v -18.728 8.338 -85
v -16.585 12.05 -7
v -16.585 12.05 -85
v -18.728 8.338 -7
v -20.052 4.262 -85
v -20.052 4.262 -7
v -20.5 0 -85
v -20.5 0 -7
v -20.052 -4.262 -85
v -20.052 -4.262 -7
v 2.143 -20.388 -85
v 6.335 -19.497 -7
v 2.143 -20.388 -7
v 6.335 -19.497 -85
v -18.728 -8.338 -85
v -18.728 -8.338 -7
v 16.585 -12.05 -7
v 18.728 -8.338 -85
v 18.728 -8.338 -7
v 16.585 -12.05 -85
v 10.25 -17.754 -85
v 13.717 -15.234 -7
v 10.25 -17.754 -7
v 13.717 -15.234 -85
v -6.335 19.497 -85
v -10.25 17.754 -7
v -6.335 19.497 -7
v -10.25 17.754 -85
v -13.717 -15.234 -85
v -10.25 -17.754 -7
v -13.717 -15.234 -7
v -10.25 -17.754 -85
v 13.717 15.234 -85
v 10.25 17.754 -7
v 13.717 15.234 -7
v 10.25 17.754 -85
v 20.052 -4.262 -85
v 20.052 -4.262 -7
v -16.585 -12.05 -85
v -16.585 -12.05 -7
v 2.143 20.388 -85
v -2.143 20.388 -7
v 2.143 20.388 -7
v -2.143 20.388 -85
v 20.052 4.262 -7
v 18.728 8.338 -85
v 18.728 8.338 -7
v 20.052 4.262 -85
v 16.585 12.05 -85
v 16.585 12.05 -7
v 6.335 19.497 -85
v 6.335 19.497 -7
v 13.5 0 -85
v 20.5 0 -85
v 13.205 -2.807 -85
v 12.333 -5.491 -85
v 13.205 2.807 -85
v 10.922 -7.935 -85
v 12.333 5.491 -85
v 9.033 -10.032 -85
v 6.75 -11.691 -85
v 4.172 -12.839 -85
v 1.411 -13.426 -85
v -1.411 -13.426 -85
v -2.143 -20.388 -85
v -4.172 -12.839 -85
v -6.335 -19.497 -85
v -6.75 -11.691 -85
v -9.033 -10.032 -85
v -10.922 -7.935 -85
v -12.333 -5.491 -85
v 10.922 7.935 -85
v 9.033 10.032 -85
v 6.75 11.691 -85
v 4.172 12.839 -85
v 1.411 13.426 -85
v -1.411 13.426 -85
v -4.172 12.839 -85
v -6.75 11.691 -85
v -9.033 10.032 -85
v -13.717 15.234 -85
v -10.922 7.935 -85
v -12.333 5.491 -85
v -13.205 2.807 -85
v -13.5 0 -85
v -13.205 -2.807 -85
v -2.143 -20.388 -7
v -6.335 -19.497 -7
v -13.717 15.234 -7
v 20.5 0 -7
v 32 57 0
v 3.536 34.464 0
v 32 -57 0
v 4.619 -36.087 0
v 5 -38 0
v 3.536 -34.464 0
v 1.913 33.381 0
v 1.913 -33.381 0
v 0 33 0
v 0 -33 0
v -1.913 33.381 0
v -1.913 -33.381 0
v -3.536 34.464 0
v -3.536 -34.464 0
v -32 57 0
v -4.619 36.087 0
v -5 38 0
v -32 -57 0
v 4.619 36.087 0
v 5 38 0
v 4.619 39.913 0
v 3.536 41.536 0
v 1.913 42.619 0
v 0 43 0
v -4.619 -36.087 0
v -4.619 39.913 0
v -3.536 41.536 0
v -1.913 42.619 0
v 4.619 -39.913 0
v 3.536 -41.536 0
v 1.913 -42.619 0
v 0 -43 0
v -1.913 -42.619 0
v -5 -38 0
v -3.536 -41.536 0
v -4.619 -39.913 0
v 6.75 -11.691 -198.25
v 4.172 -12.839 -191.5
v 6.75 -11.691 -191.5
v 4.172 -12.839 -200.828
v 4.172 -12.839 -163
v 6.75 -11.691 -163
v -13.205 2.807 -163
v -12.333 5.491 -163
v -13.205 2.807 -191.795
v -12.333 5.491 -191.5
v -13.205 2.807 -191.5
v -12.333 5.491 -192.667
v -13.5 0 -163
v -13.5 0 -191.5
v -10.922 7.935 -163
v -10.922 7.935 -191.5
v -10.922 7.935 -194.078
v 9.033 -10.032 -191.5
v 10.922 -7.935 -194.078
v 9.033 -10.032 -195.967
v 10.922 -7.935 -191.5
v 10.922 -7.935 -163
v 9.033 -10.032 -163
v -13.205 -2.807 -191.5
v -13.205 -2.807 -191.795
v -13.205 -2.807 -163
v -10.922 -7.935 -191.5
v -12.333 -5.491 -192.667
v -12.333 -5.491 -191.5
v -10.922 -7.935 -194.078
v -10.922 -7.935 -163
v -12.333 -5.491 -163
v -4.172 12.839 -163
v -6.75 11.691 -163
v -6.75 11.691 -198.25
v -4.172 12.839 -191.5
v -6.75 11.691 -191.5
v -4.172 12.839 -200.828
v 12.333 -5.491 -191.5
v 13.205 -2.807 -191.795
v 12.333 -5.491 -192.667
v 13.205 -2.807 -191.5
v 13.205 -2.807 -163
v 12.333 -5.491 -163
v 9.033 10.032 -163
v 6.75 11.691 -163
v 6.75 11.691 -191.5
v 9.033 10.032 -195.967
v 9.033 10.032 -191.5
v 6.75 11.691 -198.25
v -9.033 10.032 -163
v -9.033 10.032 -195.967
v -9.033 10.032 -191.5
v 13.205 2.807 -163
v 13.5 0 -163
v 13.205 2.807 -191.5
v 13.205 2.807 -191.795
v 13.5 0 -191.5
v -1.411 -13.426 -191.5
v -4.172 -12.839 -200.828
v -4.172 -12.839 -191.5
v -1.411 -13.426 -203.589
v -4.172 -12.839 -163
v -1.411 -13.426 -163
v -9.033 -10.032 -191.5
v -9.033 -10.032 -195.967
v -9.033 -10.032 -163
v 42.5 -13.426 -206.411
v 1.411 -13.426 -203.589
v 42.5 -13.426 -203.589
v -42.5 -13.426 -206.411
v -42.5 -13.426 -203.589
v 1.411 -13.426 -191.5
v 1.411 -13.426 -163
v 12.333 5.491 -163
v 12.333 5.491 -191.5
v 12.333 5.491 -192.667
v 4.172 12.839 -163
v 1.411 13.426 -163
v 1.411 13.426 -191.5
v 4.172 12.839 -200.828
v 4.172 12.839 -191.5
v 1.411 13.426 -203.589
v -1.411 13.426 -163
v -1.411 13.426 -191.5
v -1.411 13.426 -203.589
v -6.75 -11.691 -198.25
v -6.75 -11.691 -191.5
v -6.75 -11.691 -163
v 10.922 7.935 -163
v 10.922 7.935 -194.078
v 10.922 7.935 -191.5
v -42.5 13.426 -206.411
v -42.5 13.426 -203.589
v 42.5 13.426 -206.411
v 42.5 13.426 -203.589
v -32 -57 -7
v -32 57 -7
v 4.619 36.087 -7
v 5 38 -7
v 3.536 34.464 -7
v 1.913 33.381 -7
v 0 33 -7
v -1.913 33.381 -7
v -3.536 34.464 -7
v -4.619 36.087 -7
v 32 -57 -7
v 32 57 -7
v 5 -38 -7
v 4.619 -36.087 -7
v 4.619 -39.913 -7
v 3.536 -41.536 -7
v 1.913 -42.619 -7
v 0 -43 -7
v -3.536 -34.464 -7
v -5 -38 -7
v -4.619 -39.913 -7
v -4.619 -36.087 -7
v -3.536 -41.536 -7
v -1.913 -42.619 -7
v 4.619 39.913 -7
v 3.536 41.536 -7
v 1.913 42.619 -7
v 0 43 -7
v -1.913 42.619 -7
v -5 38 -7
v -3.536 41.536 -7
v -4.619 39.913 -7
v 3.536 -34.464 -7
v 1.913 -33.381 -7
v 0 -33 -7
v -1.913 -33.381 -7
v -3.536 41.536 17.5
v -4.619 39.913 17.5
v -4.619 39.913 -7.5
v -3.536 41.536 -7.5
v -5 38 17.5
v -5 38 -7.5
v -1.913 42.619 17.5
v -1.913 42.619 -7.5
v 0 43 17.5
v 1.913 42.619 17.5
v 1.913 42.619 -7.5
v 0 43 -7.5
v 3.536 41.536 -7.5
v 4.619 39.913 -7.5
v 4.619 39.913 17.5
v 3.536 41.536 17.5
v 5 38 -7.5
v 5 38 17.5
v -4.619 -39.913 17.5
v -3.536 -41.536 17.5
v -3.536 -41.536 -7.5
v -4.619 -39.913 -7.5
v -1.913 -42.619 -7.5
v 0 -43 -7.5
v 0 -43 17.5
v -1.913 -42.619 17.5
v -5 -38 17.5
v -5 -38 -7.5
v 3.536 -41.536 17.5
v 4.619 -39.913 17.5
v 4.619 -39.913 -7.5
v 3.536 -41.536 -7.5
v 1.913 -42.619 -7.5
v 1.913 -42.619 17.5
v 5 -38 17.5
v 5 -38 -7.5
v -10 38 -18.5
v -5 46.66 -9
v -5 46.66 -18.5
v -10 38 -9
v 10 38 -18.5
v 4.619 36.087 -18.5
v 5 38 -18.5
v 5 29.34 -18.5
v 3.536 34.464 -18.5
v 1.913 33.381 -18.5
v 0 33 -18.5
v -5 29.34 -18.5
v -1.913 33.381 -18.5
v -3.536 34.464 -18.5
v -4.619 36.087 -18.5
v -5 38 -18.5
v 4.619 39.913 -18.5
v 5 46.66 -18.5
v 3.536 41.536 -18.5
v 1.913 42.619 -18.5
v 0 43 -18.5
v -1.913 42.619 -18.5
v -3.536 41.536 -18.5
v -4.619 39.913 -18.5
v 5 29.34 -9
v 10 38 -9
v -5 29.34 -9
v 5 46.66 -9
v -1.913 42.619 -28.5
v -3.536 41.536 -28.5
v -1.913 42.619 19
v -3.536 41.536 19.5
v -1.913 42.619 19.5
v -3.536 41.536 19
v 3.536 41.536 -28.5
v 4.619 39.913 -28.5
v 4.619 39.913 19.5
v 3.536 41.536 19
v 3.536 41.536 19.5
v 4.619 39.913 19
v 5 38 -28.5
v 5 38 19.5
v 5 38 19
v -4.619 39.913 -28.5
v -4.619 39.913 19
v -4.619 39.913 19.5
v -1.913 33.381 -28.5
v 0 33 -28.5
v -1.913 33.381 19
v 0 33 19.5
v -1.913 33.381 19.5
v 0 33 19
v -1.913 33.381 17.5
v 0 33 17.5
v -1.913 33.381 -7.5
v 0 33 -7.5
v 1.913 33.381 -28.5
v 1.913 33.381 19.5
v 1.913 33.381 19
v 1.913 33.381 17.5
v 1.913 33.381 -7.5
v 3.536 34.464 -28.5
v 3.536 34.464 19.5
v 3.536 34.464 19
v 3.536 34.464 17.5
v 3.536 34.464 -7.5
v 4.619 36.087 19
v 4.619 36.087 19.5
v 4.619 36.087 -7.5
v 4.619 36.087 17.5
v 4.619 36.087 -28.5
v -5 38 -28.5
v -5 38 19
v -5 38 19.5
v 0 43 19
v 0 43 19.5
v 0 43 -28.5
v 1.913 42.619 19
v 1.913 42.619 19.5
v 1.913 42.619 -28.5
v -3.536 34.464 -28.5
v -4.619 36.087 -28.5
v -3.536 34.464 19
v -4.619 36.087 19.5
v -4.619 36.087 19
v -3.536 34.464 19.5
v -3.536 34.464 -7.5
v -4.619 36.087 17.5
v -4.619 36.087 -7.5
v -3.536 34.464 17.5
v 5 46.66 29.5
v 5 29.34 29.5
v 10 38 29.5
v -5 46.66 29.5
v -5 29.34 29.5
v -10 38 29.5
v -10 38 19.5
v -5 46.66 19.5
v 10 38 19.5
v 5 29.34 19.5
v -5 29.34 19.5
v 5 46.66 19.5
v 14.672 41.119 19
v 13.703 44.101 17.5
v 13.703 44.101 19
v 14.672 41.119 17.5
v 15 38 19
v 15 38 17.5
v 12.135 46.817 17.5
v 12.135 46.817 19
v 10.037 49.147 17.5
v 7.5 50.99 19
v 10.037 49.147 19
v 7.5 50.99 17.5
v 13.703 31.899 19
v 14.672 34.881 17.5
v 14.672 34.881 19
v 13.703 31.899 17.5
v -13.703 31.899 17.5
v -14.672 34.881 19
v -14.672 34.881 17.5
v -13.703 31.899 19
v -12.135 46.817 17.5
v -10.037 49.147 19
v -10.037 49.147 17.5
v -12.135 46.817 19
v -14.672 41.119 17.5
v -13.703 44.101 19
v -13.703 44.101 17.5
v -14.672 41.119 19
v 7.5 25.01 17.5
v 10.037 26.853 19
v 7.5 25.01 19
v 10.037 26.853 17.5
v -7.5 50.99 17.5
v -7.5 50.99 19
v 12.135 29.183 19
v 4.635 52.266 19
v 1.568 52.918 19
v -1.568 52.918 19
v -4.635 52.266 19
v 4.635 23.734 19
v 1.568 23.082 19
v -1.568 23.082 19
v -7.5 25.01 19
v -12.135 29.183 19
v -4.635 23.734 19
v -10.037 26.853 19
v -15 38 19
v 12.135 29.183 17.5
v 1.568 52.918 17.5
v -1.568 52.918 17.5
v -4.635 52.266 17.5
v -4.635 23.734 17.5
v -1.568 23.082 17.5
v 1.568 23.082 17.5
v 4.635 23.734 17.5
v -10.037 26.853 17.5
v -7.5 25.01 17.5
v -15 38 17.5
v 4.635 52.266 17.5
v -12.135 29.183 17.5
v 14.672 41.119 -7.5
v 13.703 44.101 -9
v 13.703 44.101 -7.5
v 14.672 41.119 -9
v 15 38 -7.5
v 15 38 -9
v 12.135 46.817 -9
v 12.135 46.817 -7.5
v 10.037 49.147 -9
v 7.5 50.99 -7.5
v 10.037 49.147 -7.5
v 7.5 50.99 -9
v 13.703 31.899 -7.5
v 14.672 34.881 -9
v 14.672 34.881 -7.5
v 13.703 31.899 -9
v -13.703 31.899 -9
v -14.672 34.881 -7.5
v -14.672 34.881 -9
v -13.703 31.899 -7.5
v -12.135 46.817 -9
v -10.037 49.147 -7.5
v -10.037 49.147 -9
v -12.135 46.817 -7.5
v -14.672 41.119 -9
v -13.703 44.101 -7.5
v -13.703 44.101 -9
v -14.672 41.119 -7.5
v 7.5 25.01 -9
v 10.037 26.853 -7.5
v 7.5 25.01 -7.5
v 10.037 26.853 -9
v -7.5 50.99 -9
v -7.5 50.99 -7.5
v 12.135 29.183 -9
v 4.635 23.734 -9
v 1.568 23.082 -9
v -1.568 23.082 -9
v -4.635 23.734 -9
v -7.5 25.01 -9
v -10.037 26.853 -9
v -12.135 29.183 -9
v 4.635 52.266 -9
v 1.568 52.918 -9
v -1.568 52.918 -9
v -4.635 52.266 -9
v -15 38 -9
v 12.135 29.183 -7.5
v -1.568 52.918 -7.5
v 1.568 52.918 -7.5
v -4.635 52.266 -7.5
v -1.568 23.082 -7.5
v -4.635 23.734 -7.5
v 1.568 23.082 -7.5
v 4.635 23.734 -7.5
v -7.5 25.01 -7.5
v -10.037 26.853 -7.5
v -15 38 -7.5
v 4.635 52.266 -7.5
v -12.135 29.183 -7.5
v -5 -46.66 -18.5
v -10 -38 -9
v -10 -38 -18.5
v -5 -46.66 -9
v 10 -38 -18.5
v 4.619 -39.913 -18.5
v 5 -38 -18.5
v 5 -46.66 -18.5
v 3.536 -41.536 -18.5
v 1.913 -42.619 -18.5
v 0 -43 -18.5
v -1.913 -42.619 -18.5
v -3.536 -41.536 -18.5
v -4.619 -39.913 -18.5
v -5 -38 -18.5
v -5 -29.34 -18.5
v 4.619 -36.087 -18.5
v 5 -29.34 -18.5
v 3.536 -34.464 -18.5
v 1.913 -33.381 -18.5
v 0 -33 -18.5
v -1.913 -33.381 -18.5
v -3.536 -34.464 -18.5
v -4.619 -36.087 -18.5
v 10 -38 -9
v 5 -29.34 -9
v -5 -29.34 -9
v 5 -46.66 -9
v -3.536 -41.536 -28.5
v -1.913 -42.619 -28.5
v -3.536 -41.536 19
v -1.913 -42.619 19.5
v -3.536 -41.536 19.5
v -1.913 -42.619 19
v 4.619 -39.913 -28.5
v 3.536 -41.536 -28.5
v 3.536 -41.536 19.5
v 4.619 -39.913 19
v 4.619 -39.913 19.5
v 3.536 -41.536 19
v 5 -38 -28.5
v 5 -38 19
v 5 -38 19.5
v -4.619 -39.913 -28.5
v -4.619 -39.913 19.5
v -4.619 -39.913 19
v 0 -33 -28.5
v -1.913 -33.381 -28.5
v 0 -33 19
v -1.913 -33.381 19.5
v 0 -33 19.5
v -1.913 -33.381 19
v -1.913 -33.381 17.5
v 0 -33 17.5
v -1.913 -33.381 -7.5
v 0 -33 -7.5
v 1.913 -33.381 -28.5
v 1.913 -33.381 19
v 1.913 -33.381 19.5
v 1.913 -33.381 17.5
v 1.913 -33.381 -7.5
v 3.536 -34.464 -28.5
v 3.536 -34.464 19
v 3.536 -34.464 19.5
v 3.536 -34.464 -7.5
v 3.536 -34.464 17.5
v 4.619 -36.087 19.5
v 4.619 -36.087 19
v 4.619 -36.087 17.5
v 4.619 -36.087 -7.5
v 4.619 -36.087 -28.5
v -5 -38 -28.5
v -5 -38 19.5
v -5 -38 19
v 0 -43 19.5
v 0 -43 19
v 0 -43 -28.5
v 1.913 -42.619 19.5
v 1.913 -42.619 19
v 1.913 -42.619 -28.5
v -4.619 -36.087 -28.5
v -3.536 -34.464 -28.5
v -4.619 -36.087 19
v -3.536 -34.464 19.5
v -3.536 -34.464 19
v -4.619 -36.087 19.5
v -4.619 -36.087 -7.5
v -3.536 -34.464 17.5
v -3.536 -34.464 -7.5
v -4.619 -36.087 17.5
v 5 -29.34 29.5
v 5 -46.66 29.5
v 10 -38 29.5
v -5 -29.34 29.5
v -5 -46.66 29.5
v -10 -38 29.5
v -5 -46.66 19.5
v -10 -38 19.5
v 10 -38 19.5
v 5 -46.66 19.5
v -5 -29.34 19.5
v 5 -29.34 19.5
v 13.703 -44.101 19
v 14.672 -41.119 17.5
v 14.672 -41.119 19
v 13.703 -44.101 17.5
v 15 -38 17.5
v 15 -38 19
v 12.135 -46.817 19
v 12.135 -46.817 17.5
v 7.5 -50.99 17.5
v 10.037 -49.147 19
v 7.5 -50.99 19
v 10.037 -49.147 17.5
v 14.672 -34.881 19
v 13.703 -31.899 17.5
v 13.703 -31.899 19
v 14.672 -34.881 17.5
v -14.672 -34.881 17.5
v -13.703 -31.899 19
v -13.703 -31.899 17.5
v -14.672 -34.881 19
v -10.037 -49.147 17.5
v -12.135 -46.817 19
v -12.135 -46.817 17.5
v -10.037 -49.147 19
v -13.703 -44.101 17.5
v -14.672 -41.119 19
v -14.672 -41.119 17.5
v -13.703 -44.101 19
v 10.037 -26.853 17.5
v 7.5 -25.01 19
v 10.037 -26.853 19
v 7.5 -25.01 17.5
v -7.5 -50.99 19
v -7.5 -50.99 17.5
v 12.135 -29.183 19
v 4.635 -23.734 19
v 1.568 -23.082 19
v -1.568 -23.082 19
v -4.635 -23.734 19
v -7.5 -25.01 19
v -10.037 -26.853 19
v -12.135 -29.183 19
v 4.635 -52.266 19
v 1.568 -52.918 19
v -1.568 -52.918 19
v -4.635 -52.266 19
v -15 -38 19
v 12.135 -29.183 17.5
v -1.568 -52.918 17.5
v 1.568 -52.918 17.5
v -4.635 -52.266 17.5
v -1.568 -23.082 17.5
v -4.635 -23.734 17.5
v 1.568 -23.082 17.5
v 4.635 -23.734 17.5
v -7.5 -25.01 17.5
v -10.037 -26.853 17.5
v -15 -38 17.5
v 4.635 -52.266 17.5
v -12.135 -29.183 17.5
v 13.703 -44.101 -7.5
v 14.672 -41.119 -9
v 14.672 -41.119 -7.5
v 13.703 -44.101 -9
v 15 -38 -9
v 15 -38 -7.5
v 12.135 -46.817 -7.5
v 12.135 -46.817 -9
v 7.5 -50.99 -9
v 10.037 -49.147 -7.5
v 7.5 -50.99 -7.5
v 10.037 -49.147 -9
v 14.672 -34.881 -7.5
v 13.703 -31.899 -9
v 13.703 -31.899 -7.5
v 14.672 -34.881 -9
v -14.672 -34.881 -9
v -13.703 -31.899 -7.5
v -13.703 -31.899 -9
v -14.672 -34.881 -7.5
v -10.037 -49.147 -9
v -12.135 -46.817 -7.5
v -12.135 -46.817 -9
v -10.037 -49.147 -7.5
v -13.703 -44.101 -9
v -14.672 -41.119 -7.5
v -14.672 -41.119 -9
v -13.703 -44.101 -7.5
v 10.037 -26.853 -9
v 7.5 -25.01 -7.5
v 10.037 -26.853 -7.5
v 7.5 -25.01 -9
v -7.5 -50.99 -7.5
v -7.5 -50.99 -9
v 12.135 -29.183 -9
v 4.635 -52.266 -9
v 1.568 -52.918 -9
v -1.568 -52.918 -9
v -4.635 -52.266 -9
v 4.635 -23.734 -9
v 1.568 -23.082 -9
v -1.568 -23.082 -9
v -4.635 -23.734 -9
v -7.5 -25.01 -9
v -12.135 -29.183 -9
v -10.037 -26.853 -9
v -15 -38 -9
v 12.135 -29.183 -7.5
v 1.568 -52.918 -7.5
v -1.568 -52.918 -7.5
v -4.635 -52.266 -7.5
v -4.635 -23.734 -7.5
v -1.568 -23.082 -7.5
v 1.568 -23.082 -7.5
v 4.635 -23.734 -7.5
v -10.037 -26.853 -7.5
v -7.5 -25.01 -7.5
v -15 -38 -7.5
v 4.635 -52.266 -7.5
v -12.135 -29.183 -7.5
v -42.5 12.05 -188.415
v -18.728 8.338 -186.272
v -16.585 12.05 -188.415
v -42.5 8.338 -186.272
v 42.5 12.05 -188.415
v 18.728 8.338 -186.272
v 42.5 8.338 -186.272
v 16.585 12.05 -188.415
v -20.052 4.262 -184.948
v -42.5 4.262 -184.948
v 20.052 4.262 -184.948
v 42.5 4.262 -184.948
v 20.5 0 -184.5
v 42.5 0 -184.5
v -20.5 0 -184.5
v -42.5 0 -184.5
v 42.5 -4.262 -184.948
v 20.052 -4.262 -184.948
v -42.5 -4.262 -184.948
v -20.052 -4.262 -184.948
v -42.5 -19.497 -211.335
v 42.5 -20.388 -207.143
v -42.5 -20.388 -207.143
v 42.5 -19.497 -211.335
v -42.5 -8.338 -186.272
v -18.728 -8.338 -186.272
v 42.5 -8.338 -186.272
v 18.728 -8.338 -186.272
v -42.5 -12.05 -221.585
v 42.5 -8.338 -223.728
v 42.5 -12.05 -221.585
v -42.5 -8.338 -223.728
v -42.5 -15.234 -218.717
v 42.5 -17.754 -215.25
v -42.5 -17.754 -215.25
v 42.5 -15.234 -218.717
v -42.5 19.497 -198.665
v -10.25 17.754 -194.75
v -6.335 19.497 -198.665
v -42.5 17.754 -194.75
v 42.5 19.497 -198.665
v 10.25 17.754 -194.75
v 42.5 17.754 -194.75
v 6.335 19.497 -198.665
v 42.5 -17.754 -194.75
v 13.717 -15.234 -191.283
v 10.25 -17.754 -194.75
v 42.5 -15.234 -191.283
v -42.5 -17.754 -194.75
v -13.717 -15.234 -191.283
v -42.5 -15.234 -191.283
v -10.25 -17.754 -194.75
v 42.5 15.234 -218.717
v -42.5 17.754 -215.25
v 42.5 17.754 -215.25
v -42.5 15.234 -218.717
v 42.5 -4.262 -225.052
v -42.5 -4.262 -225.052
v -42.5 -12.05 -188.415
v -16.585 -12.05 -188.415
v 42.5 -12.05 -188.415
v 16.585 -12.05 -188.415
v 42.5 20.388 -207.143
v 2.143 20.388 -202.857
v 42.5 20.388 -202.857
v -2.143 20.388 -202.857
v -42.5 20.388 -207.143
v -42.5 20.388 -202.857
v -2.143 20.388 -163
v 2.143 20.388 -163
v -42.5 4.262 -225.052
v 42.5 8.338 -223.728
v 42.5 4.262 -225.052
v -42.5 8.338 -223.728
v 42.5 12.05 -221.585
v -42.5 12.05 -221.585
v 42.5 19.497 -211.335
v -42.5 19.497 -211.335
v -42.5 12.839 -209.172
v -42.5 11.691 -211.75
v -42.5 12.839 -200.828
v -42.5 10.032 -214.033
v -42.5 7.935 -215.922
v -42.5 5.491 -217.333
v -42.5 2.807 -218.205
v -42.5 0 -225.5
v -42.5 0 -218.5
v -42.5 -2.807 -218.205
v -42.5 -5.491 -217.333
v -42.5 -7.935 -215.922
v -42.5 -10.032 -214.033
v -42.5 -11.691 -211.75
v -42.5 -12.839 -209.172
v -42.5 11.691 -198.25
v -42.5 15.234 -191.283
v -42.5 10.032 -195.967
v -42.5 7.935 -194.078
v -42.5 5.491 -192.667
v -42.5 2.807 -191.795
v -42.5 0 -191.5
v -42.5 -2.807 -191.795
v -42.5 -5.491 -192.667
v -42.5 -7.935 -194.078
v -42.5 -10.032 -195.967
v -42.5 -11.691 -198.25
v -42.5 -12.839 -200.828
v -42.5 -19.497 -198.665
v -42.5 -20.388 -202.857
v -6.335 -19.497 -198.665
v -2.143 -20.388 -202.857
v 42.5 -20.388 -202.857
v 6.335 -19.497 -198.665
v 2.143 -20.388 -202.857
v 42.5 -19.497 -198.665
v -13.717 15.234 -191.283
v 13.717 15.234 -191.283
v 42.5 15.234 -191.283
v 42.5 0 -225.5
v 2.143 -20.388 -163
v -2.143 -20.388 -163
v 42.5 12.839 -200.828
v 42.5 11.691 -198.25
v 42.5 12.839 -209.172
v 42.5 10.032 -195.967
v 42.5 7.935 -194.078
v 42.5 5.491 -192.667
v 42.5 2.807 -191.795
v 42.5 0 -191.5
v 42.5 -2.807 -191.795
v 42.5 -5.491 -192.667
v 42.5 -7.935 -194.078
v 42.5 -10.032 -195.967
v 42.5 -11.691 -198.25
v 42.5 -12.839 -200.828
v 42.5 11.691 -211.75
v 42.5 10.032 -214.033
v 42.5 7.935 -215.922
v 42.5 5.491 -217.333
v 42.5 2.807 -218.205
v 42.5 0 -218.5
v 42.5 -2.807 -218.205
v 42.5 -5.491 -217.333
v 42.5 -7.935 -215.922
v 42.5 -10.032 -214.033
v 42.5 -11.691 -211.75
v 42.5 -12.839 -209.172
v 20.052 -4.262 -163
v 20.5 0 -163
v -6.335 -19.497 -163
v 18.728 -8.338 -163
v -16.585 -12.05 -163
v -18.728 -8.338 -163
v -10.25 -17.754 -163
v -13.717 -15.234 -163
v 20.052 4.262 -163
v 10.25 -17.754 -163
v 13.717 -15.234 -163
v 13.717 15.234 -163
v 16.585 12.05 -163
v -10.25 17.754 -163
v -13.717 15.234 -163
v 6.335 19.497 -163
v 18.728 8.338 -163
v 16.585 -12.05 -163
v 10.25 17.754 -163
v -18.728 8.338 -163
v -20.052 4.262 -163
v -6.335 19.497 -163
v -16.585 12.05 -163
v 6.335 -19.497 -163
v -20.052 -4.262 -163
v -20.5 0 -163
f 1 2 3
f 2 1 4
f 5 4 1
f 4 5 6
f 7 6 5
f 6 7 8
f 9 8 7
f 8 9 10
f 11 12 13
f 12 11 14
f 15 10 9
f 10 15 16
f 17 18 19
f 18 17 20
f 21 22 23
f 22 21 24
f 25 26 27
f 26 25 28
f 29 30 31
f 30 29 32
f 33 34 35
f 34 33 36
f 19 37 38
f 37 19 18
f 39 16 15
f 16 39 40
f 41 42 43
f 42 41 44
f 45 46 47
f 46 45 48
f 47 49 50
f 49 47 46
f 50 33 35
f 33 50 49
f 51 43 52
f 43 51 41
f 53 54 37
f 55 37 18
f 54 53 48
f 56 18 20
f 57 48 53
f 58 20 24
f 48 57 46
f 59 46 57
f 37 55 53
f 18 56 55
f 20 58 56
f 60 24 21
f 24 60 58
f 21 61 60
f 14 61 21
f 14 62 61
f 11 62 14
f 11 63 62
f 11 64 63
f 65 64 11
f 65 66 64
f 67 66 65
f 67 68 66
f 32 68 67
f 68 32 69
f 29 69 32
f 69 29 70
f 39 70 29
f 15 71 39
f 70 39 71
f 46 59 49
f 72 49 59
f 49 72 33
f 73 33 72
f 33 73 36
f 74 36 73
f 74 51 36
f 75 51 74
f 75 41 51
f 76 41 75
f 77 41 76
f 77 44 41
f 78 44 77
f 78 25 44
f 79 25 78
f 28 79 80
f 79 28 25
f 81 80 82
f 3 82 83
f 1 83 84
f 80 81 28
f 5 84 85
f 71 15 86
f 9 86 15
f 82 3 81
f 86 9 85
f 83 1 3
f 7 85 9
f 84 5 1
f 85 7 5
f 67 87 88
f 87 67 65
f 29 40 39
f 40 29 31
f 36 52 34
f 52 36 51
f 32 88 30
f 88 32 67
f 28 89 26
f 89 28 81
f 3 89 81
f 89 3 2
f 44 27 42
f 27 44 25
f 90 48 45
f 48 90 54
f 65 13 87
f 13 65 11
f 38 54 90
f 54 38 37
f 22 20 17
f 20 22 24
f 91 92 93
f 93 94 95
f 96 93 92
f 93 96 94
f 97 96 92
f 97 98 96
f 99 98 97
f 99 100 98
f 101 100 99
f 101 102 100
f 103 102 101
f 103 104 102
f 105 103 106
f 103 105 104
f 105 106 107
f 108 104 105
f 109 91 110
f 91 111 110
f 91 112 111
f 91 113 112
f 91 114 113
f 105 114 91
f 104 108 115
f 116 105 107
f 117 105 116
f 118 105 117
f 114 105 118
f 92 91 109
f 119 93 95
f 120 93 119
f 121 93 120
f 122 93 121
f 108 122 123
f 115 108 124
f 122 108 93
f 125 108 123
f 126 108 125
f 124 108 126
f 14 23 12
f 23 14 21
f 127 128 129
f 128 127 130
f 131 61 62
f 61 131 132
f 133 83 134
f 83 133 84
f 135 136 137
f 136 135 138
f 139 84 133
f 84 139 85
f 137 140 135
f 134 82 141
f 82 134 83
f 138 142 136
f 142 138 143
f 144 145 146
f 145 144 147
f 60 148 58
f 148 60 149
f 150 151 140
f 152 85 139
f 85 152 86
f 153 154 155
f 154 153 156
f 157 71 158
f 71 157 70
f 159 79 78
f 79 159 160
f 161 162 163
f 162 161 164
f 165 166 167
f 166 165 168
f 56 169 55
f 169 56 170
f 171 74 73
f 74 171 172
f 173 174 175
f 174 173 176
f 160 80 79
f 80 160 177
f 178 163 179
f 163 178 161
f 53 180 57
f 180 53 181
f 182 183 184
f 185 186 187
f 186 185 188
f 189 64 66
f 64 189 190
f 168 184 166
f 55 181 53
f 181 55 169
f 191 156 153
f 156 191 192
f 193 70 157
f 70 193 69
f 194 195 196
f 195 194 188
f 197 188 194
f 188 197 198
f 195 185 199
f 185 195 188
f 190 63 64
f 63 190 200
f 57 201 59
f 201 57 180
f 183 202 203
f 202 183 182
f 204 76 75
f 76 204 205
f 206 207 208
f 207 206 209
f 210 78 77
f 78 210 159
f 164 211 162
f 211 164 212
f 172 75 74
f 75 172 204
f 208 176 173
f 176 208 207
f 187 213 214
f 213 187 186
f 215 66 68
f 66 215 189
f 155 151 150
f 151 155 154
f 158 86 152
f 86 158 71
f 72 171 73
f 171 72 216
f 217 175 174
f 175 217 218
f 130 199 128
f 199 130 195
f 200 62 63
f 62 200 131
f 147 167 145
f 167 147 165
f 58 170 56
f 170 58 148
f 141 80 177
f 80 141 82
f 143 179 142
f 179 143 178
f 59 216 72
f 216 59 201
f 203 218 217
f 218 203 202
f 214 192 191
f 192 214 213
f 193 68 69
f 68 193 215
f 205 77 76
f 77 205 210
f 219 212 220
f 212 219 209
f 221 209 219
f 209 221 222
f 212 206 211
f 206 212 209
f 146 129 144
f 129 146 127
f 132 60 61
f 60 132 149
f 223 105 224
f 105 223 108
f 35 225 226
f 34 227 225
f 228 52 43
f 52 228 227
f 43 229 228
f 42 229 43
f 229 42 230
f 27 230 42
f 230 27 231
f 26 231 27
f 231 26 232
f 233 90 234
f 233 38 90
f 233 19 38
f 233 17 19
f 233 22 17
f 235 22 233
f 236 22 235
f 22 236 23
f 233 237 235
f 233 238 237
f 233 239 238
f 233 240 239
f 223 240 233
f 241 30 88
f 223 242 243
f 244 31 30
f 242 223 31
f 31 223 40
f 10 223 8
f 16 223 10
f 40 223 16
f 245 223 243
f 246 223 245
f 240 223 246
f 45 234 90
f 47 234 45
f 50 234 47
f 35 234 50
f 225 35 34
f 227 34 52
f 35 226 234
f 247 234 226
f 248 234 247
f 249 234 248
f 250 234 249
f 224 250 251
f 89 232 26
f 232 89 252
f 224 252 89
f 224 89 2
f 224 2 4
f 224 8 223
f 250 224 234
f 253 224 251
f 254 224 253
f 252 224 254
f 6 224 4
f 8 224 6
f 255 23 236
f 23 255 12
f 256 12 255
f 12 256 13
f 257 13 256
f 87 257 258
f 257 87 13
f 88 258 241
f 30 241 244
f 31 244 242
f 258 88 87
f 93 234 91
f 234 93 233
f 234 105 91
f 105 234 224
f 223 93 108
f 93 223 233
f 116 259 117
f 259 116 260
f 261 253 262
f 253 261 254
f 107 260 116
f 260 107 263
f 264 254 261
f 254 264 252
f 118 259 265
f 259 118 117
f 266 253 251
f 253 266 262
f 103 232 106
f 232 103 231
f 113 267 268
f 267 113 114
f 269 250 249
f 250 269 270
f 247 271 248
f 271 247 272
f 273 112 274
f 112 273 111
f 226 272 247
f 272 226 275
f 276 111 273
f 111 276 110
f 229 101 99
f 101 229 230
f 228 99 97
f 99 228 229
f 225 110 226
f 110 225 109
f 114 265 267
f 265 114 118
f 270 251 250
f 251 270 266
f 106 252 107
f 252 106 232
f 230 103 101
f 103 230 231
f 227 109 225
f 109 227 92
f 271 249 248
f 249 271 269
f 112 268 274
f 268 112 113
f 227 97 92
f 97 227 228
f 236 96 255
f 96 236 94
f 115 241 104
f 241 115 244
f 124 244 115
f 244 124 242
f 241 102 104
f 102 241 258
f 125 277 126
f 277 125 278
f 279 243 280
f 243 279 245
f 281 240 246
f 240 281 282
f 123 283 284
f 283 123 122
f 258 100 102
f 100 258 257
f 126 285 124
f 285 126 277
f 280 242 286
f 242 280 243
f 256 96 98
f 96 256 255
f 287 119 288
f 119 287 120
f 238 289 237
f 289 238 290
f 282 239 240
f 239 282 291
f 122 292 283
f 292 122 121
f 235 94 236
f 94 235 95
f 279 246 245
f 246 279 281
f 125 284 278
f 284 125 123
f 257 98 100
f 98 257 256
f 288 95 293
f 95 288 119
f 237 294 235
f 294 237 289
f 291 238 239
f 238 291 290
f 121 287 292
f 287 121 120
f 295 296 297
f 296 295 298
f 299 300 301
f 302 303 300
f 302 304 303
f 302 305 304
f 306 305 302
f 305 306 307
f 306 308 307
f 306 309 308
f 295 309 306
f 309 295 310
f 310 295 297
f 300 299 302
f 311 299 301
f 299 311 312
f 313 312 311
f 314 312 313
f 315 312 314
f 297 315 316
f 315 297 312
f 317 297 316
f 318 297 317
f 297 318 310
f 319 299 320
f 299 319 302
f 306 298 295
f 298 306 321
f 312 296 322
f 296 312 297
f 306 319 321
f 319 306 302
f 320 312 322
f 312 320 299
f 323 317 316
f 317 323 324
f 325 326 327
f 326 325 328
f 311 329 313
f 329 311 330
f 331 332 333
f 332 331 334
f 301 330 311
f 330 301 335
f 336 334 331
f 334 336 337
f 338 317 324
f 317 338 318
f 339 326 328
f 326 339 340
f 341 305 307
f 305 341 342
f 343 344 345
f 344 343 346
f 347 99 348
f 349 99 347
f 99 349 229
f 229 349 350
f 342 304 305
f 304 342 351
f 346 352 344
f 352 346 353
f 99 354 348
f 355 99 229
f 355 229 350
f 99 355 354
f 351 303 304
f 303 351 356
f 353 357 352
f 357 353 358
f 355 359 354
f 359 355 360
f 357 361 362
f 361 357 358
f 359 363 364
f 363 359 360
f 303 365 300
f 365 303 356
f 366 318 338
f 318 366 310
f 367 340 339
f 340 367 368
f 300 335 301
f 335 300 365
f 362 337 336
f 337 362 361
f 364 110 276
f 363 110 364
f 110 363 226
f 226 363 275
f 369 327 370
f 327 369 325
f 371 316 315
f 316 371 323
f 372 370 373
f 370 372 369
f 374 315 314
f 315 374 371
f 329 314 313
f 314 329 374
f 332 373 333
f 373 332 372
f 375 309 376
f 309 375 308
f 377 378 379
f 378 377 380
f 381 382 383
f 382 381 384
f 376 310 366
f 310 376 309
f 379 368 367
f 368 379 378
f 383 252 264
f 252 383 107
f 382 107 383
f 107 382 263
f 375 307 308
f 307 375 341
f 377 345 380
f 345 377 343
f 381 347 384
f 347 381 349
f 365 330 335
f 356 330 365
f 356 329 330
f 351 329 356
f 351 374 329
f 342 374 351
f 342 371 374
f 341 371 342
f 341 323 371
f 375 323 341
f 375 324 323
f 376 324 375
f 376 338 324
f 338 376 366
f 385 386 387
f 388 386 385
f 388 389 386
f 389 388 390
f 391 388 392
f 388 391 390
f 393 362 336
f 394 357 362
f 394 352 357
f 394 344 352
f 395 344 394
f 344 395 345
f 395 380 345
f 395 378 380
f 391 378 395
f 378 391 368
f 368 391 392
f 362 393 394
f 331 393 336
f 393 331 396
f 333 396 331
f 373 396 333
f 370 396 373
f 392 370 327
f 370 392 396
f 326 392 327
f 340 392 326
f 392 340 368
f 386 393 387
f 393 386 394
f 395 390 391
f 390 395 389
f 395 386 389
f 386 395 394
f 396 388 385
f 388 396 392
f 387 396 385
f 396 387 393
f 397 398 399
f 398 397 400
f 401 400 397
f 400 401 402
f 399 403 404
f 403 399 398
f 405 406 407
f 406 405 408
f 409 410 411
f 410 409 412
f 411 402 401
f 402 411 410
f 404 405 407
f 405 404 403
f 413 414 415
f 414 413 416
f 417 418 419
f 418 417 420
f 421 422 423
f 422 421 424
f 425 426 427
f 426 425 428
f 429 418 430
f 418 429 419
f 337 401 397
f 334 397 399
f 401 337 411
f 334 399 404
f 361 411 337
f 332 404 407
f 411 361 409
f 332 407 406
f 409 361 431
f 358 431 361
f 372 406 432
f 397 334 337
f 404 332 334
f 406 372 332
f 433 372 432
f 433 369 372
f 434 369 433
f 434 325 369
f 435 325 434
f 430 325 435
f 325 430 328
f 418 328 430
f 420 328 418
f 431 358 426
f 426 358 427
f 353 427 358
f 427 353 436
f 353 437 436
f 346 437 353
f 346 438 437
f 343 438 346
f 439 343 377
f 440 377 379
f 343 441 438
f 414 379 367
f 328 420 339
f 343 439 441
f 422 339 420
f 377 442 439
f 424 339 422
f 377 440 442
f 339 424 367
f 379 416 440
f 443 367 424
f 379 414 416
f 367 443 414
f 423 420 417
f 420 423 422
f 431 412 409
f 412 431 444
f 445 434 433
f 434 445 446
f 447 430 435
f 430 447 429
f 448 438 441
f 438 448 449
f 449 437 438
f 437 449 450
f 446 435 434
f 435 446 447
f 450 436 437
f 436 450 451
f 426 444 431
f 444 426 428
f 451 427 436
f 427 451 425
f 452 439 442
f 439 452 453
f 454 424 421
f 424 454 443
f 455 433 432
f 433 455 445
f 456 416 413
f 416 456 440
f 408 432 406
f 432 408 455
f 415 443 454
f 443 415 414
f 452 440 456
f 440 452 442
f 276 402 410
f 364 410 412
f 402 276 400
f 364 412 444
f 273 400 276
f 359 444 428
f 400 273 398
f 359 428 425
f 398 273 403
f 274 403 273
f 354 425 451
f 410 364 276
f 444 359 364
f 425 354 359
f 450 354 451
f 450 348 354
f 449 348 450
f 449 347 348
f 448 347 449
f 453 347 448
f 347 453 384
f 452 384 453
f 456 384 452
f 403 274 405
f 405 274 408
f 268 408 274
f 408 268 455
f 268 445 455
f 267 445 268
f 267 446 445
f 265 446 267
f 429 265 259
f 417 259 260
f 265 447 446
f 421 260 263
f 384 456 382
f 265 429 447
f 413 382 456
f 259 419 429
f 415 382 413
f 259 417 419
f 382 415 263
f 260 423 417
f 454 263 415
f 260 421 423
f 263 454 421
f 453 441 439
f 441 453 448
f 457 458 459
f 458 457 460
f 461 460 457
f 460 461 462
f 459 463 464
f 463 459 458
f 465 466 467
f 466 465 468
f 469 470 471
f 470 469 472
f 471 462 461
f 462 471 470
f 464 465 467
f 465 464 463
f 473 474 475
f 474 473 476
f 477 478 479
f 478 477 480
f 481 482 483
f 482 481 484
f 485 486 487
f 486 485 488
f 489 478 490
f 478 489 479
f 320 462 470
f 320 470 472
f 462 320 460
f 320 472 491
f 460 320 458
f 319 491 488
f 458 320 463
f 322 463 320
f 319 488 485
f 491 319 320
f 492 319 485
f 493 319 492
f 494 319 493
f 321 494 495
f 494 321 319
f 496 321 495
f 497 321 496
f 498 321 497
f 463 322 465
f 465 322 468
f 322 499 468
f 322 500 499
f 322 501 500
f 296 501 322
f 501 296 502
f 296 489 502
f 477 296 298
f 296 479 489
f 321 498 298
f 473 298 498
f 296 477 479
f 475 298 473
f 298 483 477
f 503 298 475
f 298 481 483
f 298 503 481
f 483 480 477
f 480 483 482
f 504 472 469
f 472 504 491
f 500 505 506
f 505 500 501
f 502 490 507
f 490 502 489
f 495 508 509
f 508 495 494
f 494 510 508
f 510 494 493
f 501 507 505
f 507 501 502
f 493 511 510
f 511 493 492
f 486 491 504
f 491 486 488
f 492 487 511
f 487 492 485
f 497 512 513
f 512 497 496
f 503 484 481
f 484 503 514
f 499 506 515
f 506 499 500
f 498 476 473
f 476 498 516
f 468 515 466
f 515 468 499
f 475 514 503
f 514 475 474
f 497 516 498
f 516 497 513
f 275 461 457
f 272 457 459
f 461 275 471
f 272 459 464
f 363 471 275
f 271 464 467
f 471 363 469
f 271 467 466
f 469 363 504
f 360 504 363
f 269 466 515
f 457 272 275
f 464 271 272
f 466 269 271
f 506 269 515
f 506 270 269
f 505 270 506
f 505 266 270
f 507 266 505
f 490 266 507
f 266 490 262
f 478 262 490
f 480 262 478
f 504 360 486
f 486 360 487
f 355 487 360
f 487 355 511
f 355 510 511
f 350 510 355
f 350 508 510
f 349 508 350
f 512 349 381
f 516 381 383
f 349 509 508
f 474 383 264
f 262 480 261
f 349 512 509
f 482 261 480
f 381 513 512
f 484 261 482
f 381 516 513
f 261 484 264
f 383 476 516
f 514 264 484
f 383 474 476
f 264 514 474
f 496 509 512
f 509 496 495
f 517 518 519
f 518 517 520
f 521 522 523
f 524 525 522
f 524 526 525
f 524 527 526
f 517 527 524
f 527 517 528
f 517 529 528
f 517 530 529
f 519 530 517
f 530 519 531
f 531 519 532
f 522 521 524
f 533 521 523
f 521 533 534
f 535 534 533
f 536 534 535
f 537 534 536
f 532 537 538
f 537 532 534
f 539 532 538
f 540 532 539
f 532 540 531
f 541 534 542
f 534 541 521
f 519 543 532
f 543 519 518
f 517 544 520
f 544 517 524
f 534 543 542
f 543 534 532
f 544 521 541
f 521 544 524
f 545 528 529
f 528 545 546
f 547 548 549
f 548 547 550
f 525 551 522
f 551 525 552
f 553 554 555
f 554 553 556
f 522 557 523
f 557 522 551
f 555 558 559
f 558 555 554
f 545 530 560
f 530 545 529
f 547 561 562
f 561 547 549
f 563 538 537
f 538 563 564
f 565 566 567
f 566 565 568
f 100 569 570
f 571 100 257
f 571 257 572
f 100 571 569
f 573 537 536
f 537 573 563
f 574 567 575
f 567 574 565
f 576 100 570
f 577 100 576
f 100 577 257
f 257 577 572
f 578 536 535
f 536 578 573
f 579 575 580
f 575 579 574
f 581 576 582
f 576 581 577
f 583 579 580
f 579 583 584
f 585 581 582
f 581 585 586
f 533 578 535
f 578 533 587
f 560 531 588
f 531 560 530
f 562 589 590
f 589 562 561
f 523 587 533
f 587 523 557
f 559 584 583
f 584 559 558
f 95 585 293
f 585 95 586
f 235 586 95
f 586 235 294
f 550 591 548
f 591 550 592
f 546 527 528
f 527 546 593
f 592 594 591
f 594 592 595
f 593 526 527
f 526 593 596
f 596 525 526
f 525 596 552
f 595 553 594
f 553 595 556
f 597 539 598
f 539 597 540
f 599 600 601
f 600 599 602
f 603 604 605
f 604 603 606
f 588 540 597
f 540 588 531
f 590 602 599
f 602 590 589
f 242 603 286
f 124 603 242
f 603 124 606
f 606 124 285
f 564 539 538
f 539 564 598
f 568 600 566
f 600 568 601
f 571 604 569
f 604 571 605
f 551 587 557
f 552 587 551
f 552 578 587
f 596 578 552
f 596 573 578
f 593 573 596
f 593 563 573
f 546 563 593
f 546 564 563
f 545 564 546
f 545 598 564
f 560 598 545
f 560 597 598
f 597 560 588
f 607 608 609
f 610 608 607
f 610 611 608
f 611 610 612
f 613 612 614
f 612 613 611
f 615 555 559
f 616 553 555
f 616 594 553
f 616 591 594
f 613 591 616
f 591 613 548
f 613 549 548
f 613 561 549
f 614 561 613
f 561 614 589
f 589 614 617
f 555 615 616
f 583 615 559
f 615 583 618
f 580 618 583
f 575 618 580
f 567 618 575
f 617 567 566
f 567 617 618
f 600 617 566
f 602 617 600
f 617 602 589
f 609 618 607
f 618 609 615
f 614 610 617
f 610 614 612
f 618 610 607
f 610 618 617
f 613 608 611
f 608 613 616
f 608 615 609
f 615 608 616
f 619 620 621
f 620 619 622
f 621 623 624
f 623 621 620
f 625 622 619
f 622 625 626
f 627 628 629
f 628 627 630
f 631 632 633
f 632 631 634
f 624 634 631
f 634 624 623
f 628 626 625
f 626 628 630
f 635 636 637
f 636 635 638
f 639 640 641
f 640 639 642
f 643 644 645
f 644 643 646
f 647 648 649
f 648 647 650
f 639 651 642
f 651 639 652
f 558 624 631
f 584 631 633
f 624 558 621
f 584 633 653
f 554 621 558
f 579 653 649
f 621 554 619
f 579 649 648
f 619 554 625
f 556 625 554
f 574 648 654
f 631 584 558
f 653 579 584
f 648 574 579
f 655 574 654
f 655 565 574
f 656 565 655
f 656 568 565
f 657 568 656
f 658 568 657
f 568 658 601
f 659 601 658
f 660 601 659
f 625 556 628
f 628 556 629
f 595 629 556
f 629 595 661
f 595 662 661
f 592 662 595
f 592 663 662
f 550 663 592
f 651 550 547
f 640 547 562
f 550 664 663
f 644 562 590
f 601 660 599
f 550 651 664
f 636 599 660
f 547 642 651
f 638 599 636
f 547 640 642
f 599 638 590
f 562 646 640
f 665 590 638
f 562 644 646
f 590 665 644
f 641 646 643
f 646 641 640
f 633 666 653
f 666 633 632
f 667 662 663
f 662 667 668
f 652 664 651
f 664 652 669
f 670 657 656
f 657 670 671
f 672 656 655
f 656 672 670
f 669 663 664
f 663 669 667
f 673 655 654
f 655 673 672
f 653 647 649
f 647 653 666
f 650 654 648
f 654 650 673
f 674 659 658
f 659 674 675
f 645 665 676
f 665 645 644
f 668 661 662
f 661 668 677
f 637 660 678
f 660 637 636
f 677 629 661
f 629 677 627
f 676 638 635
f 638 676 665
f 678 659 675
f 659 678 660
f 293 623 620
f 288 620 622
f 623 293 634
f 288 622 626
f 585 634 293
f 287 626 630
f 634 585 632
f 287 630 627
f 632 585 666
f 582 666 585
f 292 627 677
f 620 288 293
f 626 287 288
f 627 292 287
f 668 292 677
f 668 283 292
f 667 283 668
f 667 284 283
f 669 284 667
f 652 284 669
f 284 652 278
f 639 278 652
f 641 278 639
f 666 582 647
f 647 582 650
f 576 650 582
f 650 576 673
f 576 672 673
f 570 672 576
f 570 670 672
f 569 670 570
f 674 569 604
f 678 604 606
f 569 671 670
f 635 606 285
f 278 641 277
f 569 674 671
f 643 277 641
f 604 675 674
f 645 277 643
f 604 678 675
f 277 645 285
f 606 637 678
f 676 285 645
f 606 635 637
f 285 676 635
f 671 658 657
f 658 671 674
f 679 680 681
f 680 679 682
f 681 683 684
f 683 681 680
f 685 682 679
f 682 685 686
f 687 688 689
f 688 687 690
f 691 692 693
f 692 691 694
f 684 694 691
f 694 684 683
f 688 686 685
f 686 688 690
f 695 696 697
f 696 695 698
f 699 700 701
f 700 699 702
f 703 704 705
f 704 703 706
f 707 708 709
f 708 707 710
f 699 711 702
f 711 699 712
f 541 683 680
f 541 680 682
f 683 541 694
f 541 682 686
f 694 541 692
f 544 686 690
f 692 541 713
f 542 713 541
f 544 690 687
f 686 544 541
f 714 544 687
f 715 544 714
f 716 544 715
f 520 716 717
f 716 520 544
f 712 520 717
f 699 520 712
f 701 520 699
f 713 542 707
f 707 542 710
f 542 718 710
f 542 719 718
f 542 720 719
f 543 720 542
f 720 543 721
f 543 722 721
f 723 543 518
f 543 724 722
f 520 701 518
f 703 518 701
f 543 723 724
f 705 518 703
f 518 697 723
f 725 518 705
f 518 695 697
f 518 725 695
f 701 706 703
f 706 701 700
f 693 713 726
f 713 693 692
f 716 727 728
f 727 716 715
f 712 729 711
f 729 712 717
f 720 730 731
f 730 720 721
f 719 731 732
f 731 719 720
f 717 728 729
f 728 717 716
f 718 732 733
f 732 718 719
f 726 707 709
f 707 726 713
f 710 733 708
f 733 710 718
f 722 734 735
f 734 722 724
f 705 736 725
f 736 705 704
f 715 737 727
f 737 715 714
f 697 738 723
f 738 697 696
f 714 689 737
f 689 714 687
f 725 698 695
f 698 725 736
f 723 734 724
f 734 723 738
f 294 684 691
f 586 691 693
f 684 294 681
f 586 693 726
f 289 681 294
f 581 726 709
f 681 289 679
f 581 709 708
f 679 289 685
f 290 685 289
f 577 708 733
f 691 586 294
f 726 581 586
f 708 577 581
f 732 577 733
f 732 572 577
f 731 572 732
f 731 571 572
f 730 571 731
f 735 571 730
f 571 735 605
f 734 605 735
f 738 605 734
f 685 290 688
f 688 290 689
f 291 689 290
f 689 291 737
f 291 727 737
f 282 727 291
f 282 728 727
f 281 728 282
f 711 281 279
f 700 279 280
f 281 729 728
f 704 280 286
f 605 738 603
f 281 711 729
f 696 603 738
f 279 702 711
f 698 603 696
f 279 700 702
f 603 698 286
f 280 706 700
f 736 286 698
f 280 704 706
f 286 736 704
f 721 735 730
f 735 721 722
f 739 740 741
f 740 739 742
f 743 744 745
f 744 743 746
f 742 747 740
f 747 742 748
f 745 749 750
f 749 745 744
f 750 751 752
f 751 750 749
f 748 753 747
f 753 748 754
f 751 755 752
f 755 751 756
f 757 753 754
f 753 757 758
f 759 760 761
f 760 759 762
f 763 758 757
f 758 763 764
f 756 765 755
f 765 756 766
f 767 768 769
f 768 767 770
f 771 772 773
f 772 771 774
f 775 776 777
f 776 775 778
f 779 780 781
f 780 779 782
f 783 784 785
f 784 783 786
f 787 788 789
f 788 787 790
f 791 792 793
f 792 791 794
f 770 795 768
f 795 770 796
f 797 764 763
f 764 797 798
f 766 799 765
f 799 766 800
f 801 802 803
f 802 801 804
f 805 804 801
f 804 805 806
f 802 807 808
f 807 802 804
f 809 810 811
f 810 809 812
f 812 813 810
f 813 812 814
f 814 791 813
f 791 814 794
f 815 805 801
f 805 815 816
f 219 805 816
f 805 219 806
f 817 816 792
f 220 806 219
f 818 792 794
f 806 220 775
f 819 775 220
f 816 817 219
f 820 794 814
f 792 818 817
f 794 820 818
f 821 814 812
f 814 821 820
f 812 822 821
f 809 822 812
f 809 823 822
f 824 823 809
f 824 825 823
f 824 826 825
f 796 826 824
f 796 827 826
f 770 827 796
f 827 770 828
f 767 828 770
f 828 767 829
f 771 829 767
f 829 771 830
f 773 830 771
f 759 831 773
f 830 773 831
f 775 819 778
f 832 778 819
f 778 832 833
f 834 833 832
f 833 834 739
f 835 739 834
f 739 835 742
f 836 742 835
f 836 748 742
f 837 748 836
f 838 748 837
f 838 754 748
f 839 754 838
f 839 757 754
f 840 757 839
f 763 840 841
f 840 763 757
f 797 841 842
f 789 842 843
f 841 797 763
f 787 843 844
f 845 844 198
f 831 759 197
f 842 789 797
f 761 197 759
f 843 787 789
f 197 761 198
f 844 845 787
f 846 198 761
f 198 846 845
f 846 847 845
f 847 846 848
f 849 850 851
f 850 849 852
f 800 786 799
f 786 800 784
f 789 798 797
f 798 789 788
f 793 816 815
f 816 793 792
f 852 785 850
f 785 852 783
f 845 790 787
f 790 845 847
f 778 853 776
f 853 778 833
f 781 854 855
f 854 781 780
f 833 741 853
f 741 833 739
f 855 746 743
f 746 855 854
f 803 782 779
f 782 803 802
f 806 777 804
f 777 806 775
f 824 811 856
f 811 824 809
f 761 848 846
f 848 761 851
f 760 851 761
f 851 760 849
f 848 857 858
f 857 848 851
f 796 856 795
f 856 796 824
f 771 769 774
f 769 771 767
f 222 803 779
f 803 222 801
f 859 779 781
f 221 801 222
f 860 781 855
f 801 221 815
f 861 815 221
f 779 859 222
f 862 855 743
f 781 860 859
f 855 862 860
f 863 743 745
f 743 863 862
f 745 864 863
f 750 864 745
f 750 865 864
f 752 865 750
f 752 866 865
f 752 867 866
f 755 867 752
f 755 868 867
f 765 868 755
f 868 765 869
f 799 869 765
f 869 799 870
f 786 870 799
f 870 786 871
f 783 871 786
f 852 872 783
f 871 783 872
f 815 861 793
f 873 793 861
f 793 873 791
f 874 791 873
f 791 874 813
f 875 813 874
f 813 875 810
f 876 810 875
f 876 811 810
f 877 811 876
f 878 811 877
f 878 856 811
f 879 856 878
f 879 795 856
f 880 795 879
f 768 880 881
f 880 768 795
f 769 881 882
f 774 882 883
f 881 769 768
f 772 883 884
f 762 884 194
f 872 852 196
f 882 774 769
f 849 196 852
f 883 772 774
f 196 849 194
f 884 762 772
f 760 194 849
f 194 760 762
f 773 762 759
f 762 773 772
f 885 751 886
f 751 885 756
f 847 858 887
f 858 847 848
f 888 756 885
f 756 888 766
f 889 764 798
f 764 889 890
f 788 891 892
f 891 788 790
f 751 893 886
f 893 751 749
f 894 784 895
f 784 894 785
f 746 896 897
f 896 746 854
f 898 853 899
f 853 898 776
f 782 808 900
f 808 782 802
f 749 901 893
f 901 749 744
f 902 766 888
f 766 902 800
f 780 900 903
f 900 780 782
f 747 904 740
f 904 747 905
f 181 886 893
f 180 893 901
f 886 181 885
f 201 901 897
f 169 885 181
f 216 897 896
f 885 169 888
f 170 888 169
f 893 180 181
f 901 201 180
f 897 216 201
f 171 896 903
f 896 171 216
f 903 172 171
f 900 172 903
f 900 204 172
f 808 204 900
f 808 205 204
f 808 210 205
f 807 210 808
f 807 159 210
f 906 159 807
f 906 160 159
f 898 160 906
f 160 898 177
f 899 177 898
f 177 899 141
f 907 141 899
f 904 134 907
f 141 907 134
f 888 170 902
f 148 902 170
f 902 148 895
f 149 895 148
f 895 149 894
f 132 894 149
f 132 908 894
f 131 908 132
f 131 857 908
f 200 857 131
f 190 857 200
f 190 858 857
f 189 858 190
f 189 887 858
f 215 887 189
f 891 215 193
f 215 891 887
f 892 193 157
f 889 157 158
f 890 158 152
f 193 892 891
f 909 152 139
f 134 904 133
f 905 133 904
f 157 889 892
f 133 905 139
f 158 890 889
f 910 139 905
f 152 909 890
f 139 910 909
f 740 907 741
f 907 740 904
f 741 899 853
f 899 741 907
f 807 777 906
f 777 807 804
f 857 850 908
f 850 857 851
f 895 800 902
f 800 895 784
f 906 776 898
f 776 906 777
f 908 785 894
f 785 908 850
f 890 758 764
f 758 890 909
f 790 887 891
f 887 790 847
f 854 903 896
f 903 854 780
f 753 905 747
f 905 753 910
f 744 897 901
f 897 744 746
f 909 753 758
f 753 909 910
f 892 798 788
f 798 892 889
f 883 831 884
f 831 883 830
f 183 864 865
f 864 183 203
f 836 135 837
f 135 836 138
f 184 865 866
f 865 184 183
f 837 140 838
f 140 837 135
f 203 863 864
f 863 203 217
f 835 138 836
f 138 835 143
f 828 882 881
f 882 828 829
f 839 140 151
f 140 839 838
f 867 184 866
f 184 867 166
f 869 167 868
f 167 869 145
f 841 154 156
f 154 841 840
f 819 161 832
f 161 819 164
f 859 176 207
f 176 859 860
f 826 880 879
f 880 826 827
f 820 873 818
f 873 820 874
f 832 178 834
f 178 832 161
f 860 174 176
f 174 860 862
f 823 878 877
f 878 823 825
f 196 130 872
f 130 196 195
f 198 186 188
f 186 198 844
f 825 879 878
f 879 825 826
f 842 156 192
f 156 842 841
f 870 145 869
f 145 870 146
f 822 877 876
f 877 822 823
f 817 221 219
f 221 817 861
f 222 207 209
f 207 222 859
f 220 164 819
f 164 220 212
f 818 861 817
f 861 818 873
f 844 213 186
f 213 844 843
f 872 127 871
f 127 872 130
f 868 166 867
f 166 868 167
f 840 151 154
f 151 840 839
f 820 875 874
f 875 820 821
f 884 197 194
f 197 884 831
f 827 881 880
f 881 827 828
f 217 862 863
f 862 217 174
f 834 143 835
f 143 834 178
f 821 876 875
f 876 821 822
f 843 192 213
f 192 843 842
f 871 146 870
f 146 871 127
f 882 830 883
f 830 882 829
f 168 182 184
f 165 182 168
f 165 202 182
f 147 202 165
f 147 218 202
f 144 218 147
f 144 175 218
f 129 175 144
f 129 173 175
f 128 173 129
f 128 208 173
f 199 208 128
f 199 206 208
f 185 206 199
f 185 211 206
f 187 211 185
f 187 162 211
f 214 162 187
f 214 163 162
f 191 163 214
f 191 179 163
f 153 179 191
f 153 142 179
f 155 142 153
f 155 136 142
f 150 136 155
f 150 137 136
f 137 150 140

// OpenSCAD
// file: ../common/metric_nut.scad
// include <../../config.scad>;
use <./beam_hexagonal.scad>;
use <./metric_bolt_functions.scad>;

module metric_nut(size, centre = true) {
    height = get_metric_bolt_head_height(size);
    diameter = get_metric_bolt_head_diameter(size);
    radius = diameter / 2;
    color("gray") difference() {
        // body
        beam_hexagonal(height, diameter, centre = centre, suppress_shopping_outputs = true);
        // hole
        cylinder(height, size / 2, size / 2, center = centre);
    }
    // Shopping
    echo(str("Nut: Nut M", size, " - x1"));
}

// $fn = 200;
metric_nut(12);
// file: ../common/beam_hexagonal.scad
// include <../../config.scad>;

module beam_hexagonal(L, d, centre = true, suppress_shopping_outputs = false) {
    radius = d / 2;
    linear_extrude(L, center = centre) polygon([[radius, 0], [radius * cos(60), radius * sin(60)], [radius * cos(120), radius * sin(120)], [radius * cos(180), radius * sin(180)], [radius * cos(240), radius * sin(240)], [radius * cos(300), radius * sin(300)]]);
    // Shopping
    if (!suppress_shopping_outputs) {
        echo(str("Hexagonal beam: Hexagonal beam Φ", d, "mm x ", L, "mm - x1"));
    }
}

// $fn = 200;
beam_hexagonal(500, 50);
// file: ../fixings/tube_clamp_square_base_plate_132_functions.scad
function get_L_shaft_with_base_plate_square_base_plate_132(beam_width) = 
    // (beam_width == 40) ?
    75
;
function get_R_plate_square_base_plate_132(beam_width) = 
    // (beam_width == 40) ?
    [143, 75, 18.5]
;
function get_thickness_square_base_plate_132(beam_width) = 
    // (beam_width == 40) ?
    8
;
function get_offset_hole_x_square_base_plate_132(beam_width) = 
    // (beam_width == 40) ?
    100 / 2
;
function get_diameter_hole_square_base_plate_132(beam_width) = 
    // (beam_width == 40) ?
    10
;
// file: ../fixings/tube_clamp_round_base_plate_132_functions.scad
function get_L_shaft_with_base_plate_round_base_plate_132(tube_diameter) = 
    (tube_diameter == 27) ? 
        85
    : (tube_diameter == 42) ?
        122
    : 25
;
function get_R_plate_round_base_plate_132(tube_diameter) = 
    (tube_diameter == 27) ? 
        [64, 114, 7]
    : (tube_diameter == 42) ?
        [80, 140, 10]
    : [10, 20, 1]
;
function get_offset_hole_y_round_base_plate_132(tube_diameter) = 
    (tube_diameter == 27) ? 
        38
    : (tube_diameter == 42) ?
        50
    : 10
;
function get_diameter_hole_round_base_plate_132(tube_diameter) = 10;
// file: ../fixings/tube_clamp_round_3_way_through_116_functions.scad
function  get_L_shaft_long_round_3_way_through_116(tube_diameter) = 
    (tube_diameter == 27) ? 
        42
    : (tube_diameter == 42) ?
        60
    : 25
;
function get_thickness_round_3_way_through_116(tube_diameter) = 7;
function get_L_shaft_short_round_3_way_through_116(tube_diameter) = tube_diameter + 2 * get_thickness_round_3_way_through_116();
// file: ../fixings/tube_clamp_round_tee_long_104_functions.scad
// include <../../config.scad>;

function get_L_shaft_long_round_tee_long_104(tube_diameter) = 
    (tube_diameter == 27) ? 
        85
    : (tube_diameter == 42) ?
        122
    : 25
;
function get_L_shaft_short_round_tee_long_104(tube_diameter) = 
    (tube_diameter == 27) ? 
        42
    : (tube_diameter == 42) ?
        61
    : 10
;
// file: ../brake/brake_assembly_functions.scad
// include <../../config.scad>; // circular reference!

function get_y_pos_lead_fixing_ballscrew_to_brake_arms(angle_brake_rod, y_pos_axle_rear, x_pos_axle_leg_rear, x_offset_fixing_brake_arm_to_lead_plate) = y_pos_axle_rear + (x_pos_axle_leg_rear - x_offset_fixing_brake_arm_to_lead_plate) / tan(angle_brake_rod); // (X_POS_AXLE_LEG_REAR - X_OFFSET_FIXING_BRAKE_ARM_TO_LEAD_PLATE)
// file: ../common/metric_bolt_functions.scad
function get_metric_bolt_head_height(size) = size;
function get_metric_bolt_head_diameter(size) = size * 2;
function get_metric_bolt_washer_diameter_safe_working_clearance(size) = 
    (size < 20) ?
        4 * size
    :
        3 * size
;
// file: ../common/washer.scad
include <../../config.scad>;

module washer(t, d_outer, d_inner, centre = true) {
    r_outer = d_outer / 2;
    r_inner = d_inner / 2;
    color("silver") difference() {
        cylinder(t, r_outer, r_outer, center = centre);
        cylinder(t, r_inner, r_inner, center = centre);
    }
    // Shopping
    echo(str("Washer: Washer Φ", d_outer, "mm x ", d_inner, "mm x ", t, "mm - x1"));
}

// $fn = 200;
washer(3, 10, 40);
// file: ../common/metric_bolt.scad
// include <../../config.scad>;
use <./beam_hexagonal.scad>;
use <./metric_bolt_functions.scad>;
use <./metric_nut.scad>;

module metric_bolt(size, length, has_nut = true, offset_nut_from_end = 0) {
    echo("Metric bolt assembly:");
    head_height = get_metric_bolt_head_height(size);
    head_diameter = get_metric_bolt_head_diameter(size);
    head_radius = head_diameter / 2;
    color("gray") union() {
        // Stem
        cylinder(length, size / 2, size / 2, center = true);
        // Head
        translate([0, 0, length / 2 - size / 2]) beam_hexagonal(head_height, head_diameter, centre = true, suppress_shopping_outputs = true);
        if (has_nut) {
            // Nut
            translate([0, 0, -(length / 2 - size / 2) + offset_nut_from_end]) metric_nut(size);
        }
    }
    // Shopping
    echo(str("Bolt: Bolt M", size, " x ", length, "mm - x1"));
}

// $fn = 200;
metric_bolt(12, 100);
translate([30, 0, 0]) metric_bolt(12, 100, false);
translate([60, 0, 0]) metric_bolt(12, 100, true, 5);
// file: ../fixings/tube_clamp_round_base_plate_132.scad
include <../../config.scad>;
use <./tube_clamp_round_base_plate_132_functions.scad>;

module tube_clamp_round_base_plate_132(tube_diameter) {
    L_shaft_with_base_plate = get_L_shaft_with_base_plate_round_base_plate_132(tube_diameter);
    R_plate = get_R_plate_round_base_plate_132(tube_diameter);
    t = R_plate[2];
    offset_hole_y = get_offset_hole_y_round_base_plate_132(tube_diameter);
    d_hole_bolt_round_base_plate_132 = get_diameter_hole_round_base_plate_132(tube_diameter);
    color("LightGrey") union() {
        // cylinder section
        translate([0, 0, L_shaft_with_base_plate / 2]) difference() {
            cylinder(L_shaft_with_base_plate, tube_diameter / 2 + t, tube_diameter / 2 + t, center = true);
            cylinder(L_shaft_with_base_plate, tube_diameter / 2, tube_diameter / 2, center = true);
        }
        // base plate
        translate([0, 0, R_plate[2] / 2]) difference() {
            cube(R_plate, center = true);
            translate([0, offset_hole_y, 0]) cylinder(R_plate[2], d_hole_bolt_round_base_plate_132 / 2, d_hole_bolt_round_base_plate_132 / 2, center = true);
            translate([0, -offset_hole_y, 0]) cylinder(R_plate[2], d_hole_bolt_round_base_plate_132 / 2, d_hole_bolt_round_base_plate_132 / 2, center = true);
        }
    }
    // Shopping
    echo("Round base plate 132: Tube clamp - x1");
}

// test output
tube_clamp_round_base_plate_132(27);
translate([200, 0, 0]) tube_clamp_round_base_plate_132(42);
// file: ../fixings/tube_clamp_round_tee_long_104.scad
include <../../config.scad>;
use <./tube_clamp_round_tee_long_104_functions.scad>;

module tube_clamp_round_tee_long_104(tube_diameter) {
    t = 7;
    L_shaft_long = get_L_shaft_long_round_tee_long_104(tube_diameter);
    L_shaft_short = get_L_shaft_short_round_tee_long_104(tube_diameter);
    color("LightGrey") difference() {
        union() {
            // long edge
            cylinder(L_shaft_long, tube_diameter / 2 + t, tube_diameter / 2 + t, center = true);
            // short perpendicular section
            translate([L_shaft_short / 2, 0, 0]) rotate([0, 90, 0]) cylinder(L_shaft_short, tube_diameter / 2 + t, tube_diameter / 2 + t, center = true);
        }
        cylinder(L_shaft_long, tube_diameter / 2, tube_diameter / 2, center = true);
        translate([L_shaft_short / 2, 0, 0]) rotate([0, 90, 0]) cylinder(L_shaft_short, tube_diameter / 2, tube_diameter / 2, center = true);
    }
    // Shopping
    echo("Round tee long 104: Tube clamp - x1");
}

// test output
tube_clamp_round_tee_long_104(27);
translate([200, 0, 0]) tube_clamp_round_tee_long_104(42);
// main file
include <../../config.scad>;
use <../fixings/tube_clamp_round_tee_long_104.scad>;
use <../fixings/tube_clamp_round_base_plate_132.scad>;
use <../common/metric_bolt.scad>;
use <../common/washer.scad>;

module rear_leg_fixing() {
    echo("Rear leg fixing:");
    R_base_plate = get_R_plate_round_base_plate_132(D_AXLE_REAR);
    h_leg = Z_OFFSET_BED_TO_AXLE - R_base_plate[2] - D_AXLE_REAR / 2;
    offset_y_hole_base_plate = get_offset_hole_y_round_base_plate_132(D_AXLE_REAR);
    size_hole_base_plate = get_diameter_hole_round_base_plate_132(D_AXLE_REAR);
    h_bolt_head = get_metric_bolt_head_height(size_hole_base_plate);
    L_fastener = h_bolt_head * 2 + T_WASHER_BASE_PLATE * 2 + R_base_plate[2] + R_BED[2] + L_BOLT_EXTENSION;
    union() {
        // bracket bed
        rotate([0, 180, 0]) tube_clamp_round_base_plate_132(D_AXLE_REAR); // cylinder(R_fixing[2], R_fixing[0] / 2, R_fixing[0] / 2, center = true); // cube(R_fixing, center = true);
        
        for (index_side_y = [0 : 1 : 1]) {
            mirror([0, index_side_y, 0]) {
                // bracket at bed fastener
                translate([0, offset_y_hole_base_plate, L_fastener / 2 - R_base_plate[2] - L_BOLT_EXTENSION - h_bolt_head - T_WASHER_BASE_PLATE]) metric_bolt(size_hole_base_plate, L_fastener, true, L_BOLT_EXTENSION);
                translate([0, offset_y_hole_base_plate, h_bolt_head / 2 - 0* T_WASHER_BASE_PLATE / 2]) for (index_side_z = [0 : 1 : 1]) {
                    mirror([0, 0, index_side_z]) {
                        // bracket fastener washers
                        translate([0, 0, L_fastener / 2 - L_BOLT_EXTENSION / 2 - h_bolt_head - T_WASHER_BASE_PLATE / 2]) washer(T_WASHER_BASE_PLATE, D_WASHER_BASE_PLATE, size_hole_base_plate);
                    }
                }
            }
        }
        // leg
        color(COLOUR_BEAM_ALUMINIUM) translate([0, 0, -R_base_plate[2] - h_leg / 2]) cylinder(h_leg, D_AXLE_REAR / 2, D_AXLE_REAR / 2, center = true); // cube([t_beam, t_beam, h_leg], center = true);
        // bracket axle-side
        translate([0, 0, -Z_OFFSET_BED_TO_AXLE]) rotate([0, -90, 0]) tube_clamp_round_tee_long_104(D_AXLE_REAR); // cylinder(R_fixing[2], R_fixing[0] / 2, R_fixing[0] / 2, center = true);
    }
    // Shopping
    // bracket at bed
    // bracket bolt
    // echo(str("Base plate fastening washers: Washer Φ", D_WASHER_BASE_PLATE, "mm x ", T_WASHER_BASE_PLATE, "mm - x4")); // Base plate fastening washers
    echo(str("Leg: Round Aluminium bar Φ", D_AXLE_REAR, "mm x ", h_leg, "mm - x1"));
    // bracket at axle
}

rear_leg_fixing();
